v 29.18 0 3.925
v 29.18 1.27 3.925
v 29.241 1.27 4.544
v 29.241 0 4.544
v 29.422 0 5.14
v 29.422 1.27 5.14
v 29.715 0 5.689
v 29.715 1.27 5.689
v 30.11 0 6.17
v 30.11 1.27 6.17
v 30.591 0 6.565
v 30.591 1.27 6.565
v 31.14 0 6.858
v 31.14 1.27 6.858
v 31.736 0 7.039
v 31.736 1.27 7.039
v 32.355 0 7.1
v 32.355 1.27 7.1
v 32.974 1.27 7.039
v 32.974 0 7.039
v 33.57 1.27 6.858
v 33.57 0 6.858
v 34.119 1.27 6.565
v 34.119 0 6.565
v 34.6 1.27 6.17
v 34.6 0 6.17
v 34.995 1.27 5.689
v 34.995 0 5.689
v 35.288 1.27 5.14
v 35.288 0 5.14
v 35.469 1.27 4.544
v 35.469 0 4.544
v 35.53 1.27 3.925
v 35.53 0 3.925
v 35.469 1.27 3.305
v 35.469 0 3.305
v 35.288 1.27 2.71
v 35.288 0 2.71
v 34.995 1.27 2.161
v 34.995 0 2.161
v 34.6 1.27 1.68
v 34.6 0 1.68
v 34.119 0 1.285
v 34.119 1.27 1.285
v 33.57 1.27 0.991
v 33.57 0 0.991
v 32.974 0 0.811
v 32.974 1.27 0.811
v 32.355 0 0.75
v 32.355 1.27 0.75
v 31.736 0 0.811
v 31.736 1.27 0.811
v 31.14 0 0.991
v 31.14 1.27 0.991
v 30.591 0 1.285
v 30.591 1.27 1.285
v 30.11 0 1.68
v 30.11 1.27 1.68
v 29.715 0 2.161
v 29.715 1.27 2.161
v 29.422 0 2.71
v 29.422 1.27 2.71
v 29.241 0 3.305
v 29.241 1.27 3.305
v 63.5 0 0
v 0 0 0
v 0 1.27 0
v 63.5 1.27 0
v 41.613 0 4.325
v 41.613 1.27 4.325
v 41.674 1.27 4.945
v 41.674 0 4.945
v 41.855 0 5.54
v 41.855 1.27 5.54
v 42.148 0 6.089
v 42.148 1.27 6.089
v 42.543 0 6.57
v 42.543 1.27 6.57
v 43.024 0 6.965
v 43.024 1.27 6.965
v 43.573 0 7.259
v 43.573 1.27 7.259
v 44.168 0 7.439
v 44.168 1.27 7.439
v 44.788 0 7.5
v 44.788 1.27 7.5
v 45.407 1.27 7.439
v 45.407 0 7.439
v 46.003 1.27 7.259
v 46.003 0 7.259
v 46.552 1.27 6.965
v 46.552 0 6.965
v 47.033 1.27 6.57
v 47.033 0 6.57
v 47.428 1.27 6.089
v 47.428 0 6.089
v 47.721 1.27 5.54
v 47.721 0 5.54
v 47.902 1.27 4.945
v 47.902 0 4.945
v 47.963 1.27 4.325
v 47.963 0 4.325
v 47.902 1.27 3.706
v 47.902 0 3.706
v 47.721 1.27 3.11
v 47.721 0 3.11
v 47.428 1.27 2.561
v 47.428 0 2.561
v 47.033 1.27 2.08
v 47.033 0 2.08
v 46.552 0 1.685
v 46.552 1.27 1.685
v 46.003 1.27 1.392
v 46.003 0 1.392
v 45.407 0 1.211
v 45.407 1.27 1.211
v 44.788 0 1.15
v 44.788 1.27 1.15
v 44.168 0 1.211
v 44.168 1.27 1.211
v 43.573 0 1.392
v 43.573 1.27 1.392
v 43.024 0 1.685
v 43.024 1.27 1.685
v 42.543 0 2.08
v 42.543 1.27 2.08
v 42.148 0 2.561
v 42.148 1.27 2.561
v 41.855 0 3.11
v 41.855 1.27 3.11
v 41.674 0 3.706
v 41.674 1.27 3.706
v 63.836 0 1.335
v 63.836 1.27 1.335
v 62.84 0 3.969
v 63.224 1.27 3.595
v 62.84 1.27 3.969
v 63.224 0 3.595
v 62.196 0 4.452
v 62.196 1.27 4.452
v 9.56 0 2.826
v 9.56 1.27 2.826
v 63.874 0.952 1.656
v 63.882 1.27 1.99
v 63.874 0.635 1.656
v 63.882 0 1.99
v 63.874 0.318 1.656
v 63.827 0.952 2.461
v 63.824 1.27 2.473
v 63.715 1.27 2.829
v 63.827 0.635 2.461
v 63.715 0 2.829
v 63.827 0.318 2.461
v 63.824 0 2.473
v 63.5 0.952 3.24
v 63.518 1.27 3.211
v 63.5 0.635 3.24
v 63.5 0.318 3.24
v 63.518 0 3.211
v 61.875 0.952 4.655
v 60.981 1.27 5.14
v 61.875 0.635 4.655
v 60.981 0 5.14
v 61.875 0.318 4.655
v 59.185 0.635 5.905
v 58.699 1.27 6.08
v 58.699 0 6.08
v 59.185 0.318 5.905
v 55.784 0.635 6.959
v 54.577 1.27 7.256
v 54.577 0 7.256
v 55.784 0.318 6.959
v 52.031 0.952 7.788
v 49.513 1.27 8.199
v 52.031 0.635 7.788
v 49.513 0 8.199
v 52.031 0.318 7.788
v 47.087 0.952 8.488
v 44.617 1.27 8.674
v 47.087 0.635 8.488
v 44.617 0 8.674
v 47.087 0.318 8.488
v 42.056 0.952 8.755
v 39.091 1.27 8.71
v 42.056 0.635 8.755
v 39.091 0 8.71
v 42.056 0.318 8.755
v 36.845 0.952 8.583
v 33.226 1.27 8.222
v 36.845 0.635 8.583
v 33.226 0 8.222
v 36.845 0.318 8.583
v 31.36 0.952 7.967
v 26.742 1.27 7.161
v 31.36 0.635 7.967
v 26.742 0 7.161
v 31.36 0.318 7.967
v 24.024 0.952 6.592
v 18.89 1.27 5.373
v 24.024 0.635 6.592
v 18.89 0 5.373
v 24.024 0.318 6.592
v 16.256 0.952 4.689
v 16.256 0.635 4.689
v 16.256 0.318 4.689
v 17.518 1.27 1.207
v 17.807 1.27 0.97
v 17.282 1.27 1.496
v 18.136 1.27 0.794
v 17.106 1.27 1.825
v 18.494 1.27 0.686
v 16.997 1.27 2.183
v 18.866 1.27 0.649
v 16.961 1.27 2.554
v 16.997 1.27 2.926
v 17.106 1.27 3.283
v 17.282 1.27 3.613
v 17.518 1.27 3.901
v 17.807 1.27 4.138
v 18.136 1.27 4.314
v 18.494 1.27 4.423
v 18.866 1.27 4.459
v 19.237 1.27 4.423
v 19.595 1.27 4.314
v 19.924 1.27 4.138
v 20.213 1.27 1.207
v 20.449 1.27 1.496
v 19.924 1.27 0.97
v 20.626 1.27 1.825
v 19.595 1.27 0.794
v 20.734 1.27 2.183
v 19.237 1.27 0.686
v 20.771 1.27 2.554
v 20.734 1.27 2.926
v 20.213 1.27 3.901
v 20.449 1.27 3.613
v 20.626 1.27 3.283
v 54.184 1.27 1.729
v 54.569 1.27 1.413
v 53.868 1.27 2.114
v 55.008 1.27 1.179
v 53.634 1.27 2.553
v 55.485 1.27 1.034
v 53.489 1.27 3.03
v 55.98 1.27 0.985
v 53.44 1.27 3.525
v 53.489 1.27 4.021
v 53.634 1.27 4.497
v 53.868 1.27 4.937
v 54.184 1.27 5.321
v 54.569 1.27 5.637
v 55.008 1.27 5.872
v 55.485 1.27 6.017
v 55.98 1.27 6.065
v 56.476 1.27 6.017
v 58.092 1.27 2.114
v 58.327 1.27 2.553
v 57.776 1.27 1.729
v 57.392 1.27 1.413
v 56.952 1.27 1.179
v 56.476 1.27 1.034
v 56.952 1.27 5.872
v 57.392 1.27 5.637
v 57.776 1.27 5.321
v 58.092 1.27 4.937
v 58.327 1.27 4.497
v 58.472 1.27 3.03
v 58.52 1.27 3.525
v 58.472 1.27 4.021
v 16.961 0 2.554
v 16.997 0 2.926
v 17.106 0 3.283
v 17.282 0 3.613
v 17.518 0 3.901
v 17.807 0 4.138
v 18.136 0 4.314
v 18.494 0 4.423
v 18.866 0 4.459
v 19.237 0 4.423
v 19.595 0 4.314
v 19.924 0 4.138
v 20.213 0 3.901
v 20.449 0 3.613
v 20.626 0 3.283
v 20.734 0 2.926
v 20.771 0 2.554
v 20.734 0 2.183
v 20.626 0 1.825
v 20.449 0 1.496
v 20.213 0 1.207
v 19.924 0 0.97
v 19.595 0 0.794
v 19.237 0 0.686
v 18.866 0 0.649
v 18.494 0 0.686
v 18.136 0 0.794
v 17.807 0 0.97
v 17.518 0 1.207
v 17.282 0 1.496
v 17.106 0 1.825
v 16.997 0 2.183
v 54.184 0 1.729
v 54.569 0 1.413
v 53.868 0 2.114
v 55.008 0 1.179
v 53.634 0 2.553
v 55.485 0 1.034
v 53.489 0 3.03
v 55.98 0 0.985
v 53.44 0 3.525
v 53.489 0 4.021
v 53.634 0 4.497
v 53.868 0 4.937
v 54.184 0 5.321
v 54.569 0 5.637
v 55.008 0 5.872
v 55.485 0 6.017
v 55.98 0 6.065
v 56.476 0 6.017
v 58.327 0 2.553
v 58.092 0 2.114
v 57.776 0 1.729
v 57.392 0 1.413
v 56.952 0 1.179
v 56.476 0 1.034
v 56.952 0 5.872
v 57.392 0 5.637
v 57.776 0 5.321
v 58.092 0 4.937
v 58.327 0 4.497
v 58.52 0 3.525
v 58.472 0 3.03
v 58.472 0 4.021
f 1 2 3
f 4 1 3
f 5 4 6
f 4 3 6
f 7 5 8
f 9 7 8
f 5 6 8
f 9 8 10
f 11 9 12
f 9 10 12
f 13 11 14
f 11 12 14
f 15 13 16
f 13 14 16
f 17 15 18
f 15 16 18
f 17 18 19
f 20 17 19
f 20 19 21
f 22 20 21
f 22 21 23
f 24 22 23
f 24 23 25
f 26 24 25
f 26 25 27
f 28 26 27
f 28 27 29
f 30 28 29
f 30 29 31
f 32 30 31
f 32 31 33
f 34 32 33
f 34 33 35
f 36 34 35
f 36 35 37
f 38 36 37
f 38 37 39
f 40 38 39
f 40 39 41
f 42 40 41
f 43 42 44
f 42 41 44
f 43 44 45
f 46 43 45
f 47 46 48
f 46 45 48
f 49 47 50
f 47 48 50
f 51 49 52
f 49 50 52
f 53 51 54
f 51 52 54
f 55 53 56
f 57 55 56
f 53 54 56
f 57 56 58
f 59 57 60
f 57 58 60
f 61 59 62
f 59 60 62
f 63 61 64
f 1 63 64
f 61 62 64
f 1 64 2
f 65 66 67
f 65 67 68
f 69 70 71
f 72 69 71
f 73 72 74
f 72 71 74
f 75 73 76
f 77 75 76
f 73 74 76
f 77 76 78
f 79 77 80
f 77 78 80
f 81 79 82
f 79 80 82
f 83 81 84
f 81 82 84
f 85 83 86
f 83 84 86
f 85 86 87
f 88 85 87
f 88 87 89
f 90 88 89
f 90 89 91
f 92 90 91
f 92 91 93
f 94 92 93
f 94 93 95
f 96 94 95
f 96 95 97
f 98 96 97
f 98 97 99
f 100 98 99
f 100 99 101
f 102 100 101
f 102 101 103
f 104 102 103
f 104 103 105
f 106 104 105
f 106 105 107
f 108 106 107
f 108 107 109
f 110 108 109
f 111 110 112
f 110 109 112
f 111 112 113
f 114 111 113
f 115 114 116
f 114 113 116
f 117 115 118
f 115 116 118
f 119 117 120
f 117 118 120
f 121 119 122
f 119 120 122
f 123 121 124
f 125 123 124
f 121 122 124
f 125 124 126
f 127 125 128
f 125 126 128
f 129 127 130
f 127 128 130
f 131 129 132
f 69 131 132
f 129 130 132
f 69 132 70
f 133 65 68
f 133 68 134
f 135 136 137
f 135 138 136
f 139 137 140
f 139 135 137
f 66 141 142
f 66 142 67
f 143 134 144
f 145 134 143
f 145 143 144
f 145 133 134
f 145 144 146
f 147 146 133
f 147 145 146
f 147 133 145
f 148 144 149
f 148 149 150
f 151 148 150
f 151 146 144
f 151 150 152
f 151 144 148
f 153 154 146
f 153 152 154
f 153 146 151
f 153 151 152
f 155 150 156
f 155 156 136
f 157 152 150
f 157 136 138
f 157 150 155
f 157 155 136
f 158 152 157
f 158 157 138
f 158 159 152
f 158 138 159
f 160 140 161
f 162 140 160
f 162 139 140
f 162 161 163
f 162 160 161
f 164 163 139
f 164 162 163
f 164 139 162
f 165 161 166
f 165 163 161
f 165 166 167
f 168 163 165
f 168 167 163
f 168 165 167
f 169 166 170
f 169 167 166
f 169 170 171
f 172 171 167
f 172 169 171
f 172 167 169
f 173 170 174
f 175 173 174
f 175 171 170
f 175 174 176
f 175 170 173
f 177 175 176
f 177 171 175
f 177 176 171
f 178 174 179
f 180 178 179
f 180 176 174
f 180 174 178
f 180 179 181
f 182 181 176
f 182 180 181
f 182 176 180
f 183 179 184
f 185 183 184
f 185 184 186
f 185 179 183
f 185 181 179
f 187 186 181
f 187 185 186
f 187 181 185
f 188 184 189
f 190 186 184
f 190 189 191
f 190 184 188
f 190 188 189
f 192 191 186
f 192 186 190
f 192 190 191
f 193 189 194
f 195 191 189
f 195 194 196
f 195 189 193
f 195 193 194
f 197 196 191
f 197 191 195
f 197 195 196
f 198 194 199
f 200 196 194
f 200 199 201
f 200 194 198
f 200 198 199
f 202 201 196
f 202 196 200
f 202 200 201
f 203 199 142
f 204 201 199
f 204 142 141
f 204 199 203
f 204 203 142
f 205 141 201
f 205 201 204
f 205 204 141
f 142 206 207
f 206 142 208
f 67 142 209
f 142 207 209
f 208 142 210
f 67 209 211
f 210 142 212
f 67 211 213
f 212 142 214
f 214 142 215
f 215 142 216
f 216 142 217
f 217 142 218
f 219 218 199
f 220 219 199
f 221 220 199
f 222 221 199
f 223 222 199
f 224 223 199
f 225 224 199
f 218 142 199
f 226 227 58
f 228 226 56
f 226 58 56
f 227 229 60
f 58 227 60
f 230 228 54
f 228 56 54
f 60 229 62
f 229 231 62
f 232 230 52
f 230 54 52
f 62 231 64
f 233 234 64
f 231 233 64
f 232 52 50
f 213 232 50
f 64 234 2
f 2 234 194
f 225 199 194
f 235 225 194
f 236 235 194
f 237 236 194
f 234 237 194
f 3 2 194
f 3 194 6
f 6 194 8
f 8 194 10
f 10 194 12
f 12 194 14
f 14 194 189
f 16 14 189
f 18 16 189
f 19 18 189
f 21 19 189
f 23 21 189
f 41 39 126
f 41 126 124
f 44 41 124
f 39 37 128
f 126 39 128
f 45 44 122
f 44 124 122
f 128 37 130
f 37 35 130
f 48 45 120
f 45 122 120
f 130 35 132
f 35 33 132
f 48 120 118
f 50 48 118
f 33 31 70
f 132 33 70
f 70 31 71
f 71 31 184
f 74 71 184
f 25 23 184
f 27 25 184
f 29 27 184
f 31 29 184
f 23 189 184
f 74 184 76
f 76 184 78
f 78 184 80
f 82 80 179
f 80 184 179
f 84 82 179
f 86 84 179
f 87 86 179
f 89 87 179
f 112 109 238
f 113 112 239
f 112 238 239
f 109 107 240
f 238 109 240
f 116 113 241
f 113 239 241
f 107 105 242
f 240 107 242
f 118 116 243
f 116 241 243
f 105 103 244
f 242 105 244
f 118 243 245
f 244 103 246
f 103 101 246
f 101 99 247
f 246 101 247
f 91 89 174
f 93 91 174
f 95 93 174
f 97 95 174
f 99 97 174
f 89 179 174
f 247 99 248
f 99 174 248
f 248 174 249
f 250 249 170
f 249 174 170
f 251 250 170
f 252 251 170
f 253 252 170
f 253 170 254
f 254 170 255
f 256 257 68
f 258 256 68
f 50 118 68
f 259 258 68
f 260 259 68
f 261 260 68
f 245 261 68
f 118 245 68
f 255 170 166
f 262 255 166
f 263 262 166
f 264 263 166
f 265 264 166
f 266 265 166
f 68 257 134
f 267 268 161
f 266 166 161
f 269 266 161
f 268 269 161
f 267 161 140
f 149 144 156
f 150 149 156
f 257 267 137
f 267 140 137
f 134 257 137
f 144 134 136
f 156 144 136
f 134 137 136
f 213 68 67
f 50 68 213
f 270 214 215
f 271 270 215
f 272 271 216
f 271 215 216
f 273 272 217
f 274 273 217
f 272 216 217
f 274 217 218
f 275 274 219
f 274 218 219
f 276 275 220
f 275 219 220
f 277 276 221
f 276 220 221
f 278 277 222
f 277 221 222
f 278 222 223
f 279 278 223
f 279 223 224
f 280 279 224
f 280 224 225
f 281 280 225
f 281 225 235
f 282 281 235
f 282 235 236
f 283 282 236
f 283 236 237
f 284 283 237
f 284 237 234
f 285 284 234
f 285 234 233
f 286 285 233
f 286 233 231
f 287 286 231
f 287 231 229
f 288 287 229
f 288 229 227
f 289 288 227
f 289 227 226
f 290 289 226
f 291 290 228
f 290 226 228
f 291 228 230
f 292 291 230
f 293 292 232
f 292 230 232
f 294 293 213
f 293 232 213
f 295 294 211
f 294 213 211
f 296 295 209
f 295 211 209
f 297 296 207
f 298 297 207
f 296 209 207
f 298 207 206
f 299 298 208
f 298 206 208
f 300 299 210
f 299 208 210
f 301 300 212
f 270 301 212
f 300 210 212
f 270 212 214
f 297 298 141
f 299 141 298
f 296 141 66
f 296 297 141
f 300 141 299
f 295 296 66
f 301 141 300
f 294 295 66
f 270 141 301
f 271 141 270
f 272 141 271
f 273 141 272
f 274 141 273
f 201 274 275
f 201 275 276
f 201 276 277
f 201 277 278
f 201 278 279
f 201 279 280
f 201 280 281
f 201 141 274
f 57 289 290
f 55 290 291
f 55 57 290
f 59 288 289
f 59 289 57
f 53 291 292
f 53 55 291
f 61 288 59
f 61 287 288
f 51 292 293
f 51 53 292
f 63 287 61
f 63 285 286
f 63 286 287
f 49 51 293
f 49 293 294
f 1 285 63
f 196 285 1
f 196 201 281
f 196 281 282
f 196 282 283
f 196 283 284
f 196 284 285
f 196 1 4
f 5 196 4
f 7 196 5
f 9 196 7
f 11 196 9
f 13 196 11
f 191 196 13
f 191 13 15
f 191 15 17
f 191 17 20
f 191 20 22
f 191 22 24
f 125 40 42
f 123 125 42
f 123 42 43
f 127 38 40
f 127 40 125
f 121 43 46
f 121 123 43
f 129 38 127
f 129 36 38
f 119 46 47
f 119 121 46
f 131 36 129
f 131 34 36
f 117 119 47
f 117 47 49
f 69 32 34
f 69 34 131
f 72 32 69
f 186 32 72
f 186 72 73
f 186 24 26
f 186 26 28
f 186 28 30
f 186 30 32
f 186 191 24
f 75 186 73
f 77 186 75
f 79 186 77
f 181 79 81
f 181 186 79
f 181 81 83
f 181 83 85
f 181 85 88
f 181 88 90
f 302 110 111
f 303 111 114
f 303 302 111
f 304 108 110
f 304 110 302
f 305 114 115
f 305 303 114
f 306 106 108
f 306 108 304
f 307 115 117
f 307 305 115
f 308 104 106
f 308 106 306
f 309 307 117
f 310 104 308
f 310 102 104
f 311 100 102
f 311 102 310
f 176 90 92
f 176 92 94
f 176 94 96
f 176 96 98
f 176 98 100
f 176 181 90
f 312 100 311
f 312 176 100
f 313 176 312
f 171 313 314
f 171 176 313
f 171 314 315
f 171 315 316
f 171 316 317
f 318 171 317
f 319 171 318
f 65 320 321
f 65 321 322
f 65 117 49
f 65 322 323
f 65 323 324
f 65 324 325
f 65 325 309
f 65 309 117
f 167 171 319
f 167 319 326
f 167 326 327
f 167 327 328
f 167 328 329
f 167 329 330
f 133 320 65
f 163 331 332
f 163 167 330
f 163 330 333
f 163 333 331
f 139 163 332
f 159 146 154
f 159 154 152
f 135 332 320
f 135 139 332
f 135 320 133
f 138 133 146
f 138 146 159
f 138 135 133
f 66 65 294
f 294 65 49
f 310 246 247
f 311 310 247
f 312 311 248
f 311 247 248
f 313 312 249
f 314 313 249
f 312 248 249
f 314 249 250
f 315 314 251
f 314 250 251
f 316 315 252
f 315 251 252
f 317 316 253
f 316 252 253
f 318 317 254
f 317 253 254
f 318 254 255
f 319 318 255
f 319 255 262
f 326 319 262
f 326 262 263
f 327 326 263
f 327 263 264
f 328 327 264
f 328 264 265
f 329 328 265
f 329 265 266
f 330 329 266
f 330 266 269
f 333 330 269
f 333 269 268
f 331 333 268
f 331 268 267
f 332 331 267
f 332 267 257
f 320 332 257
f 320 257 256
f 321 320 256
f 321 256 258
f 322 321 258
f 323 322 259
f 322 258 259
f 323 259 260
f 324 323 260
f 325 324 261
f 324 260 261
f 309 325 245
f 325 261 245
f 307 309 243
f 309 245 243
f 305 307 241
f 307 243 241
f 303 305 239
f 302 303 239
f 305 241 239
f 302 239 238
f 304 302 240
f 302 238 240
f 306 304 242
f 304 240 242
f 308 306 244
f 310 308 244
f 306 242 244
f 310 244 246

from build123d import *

# Parameters (mm, degrees)
F1_DEPTH = 1.27
F3_D     = 5.08
F4_D     = 6.35
F5_D     = 3.81


# Not quite as in the source:
# - a feature names something its author has since deleted; it is built from what else it names


with BuildPart() as f1:
    # F0 (on Front) → F1 (new body)
    with BuildSketch(Plane.XZ):
        with BuildLine():
            add(Edge.make_bspline(
                [(63.5, 0), (63.8322128437, 1.1116457049), (64.812711118, 4.3925725485), (50.520767413, 8.9452032158), (30.6942173185, 9.1884909037), (10.964974549, 3.2824308558), (0, 0)],
                knots=[0, 0, 0, 0, 0.1157736296, 0.3416959746, 0.6341325299, 1, 1, 1, 1], degree=3))
            Line((0, 0), (63.5, 0))
        make_face()
    extrude(amount=-F1_DEPTH)

    # F3 (through all)
    with Locations(Plane.XZ):
        with Locations((55.9804104269, 3.5253837705)):
            Hole(F3_D / 2)

    # F4 (through all)
    with Locations(Plane.XZ):
        with Locations((44.7878539562, 4.3252892792), (32.3550179601, 3.9246454835)):
            Hole(F4_D / 2)

    # F5 (through all)
    with Locations(Plane.XZ):
        with Locations((18.8655108213, 2.5541819632)):
            Hole(F5_D / 2)


solid = f1.part
